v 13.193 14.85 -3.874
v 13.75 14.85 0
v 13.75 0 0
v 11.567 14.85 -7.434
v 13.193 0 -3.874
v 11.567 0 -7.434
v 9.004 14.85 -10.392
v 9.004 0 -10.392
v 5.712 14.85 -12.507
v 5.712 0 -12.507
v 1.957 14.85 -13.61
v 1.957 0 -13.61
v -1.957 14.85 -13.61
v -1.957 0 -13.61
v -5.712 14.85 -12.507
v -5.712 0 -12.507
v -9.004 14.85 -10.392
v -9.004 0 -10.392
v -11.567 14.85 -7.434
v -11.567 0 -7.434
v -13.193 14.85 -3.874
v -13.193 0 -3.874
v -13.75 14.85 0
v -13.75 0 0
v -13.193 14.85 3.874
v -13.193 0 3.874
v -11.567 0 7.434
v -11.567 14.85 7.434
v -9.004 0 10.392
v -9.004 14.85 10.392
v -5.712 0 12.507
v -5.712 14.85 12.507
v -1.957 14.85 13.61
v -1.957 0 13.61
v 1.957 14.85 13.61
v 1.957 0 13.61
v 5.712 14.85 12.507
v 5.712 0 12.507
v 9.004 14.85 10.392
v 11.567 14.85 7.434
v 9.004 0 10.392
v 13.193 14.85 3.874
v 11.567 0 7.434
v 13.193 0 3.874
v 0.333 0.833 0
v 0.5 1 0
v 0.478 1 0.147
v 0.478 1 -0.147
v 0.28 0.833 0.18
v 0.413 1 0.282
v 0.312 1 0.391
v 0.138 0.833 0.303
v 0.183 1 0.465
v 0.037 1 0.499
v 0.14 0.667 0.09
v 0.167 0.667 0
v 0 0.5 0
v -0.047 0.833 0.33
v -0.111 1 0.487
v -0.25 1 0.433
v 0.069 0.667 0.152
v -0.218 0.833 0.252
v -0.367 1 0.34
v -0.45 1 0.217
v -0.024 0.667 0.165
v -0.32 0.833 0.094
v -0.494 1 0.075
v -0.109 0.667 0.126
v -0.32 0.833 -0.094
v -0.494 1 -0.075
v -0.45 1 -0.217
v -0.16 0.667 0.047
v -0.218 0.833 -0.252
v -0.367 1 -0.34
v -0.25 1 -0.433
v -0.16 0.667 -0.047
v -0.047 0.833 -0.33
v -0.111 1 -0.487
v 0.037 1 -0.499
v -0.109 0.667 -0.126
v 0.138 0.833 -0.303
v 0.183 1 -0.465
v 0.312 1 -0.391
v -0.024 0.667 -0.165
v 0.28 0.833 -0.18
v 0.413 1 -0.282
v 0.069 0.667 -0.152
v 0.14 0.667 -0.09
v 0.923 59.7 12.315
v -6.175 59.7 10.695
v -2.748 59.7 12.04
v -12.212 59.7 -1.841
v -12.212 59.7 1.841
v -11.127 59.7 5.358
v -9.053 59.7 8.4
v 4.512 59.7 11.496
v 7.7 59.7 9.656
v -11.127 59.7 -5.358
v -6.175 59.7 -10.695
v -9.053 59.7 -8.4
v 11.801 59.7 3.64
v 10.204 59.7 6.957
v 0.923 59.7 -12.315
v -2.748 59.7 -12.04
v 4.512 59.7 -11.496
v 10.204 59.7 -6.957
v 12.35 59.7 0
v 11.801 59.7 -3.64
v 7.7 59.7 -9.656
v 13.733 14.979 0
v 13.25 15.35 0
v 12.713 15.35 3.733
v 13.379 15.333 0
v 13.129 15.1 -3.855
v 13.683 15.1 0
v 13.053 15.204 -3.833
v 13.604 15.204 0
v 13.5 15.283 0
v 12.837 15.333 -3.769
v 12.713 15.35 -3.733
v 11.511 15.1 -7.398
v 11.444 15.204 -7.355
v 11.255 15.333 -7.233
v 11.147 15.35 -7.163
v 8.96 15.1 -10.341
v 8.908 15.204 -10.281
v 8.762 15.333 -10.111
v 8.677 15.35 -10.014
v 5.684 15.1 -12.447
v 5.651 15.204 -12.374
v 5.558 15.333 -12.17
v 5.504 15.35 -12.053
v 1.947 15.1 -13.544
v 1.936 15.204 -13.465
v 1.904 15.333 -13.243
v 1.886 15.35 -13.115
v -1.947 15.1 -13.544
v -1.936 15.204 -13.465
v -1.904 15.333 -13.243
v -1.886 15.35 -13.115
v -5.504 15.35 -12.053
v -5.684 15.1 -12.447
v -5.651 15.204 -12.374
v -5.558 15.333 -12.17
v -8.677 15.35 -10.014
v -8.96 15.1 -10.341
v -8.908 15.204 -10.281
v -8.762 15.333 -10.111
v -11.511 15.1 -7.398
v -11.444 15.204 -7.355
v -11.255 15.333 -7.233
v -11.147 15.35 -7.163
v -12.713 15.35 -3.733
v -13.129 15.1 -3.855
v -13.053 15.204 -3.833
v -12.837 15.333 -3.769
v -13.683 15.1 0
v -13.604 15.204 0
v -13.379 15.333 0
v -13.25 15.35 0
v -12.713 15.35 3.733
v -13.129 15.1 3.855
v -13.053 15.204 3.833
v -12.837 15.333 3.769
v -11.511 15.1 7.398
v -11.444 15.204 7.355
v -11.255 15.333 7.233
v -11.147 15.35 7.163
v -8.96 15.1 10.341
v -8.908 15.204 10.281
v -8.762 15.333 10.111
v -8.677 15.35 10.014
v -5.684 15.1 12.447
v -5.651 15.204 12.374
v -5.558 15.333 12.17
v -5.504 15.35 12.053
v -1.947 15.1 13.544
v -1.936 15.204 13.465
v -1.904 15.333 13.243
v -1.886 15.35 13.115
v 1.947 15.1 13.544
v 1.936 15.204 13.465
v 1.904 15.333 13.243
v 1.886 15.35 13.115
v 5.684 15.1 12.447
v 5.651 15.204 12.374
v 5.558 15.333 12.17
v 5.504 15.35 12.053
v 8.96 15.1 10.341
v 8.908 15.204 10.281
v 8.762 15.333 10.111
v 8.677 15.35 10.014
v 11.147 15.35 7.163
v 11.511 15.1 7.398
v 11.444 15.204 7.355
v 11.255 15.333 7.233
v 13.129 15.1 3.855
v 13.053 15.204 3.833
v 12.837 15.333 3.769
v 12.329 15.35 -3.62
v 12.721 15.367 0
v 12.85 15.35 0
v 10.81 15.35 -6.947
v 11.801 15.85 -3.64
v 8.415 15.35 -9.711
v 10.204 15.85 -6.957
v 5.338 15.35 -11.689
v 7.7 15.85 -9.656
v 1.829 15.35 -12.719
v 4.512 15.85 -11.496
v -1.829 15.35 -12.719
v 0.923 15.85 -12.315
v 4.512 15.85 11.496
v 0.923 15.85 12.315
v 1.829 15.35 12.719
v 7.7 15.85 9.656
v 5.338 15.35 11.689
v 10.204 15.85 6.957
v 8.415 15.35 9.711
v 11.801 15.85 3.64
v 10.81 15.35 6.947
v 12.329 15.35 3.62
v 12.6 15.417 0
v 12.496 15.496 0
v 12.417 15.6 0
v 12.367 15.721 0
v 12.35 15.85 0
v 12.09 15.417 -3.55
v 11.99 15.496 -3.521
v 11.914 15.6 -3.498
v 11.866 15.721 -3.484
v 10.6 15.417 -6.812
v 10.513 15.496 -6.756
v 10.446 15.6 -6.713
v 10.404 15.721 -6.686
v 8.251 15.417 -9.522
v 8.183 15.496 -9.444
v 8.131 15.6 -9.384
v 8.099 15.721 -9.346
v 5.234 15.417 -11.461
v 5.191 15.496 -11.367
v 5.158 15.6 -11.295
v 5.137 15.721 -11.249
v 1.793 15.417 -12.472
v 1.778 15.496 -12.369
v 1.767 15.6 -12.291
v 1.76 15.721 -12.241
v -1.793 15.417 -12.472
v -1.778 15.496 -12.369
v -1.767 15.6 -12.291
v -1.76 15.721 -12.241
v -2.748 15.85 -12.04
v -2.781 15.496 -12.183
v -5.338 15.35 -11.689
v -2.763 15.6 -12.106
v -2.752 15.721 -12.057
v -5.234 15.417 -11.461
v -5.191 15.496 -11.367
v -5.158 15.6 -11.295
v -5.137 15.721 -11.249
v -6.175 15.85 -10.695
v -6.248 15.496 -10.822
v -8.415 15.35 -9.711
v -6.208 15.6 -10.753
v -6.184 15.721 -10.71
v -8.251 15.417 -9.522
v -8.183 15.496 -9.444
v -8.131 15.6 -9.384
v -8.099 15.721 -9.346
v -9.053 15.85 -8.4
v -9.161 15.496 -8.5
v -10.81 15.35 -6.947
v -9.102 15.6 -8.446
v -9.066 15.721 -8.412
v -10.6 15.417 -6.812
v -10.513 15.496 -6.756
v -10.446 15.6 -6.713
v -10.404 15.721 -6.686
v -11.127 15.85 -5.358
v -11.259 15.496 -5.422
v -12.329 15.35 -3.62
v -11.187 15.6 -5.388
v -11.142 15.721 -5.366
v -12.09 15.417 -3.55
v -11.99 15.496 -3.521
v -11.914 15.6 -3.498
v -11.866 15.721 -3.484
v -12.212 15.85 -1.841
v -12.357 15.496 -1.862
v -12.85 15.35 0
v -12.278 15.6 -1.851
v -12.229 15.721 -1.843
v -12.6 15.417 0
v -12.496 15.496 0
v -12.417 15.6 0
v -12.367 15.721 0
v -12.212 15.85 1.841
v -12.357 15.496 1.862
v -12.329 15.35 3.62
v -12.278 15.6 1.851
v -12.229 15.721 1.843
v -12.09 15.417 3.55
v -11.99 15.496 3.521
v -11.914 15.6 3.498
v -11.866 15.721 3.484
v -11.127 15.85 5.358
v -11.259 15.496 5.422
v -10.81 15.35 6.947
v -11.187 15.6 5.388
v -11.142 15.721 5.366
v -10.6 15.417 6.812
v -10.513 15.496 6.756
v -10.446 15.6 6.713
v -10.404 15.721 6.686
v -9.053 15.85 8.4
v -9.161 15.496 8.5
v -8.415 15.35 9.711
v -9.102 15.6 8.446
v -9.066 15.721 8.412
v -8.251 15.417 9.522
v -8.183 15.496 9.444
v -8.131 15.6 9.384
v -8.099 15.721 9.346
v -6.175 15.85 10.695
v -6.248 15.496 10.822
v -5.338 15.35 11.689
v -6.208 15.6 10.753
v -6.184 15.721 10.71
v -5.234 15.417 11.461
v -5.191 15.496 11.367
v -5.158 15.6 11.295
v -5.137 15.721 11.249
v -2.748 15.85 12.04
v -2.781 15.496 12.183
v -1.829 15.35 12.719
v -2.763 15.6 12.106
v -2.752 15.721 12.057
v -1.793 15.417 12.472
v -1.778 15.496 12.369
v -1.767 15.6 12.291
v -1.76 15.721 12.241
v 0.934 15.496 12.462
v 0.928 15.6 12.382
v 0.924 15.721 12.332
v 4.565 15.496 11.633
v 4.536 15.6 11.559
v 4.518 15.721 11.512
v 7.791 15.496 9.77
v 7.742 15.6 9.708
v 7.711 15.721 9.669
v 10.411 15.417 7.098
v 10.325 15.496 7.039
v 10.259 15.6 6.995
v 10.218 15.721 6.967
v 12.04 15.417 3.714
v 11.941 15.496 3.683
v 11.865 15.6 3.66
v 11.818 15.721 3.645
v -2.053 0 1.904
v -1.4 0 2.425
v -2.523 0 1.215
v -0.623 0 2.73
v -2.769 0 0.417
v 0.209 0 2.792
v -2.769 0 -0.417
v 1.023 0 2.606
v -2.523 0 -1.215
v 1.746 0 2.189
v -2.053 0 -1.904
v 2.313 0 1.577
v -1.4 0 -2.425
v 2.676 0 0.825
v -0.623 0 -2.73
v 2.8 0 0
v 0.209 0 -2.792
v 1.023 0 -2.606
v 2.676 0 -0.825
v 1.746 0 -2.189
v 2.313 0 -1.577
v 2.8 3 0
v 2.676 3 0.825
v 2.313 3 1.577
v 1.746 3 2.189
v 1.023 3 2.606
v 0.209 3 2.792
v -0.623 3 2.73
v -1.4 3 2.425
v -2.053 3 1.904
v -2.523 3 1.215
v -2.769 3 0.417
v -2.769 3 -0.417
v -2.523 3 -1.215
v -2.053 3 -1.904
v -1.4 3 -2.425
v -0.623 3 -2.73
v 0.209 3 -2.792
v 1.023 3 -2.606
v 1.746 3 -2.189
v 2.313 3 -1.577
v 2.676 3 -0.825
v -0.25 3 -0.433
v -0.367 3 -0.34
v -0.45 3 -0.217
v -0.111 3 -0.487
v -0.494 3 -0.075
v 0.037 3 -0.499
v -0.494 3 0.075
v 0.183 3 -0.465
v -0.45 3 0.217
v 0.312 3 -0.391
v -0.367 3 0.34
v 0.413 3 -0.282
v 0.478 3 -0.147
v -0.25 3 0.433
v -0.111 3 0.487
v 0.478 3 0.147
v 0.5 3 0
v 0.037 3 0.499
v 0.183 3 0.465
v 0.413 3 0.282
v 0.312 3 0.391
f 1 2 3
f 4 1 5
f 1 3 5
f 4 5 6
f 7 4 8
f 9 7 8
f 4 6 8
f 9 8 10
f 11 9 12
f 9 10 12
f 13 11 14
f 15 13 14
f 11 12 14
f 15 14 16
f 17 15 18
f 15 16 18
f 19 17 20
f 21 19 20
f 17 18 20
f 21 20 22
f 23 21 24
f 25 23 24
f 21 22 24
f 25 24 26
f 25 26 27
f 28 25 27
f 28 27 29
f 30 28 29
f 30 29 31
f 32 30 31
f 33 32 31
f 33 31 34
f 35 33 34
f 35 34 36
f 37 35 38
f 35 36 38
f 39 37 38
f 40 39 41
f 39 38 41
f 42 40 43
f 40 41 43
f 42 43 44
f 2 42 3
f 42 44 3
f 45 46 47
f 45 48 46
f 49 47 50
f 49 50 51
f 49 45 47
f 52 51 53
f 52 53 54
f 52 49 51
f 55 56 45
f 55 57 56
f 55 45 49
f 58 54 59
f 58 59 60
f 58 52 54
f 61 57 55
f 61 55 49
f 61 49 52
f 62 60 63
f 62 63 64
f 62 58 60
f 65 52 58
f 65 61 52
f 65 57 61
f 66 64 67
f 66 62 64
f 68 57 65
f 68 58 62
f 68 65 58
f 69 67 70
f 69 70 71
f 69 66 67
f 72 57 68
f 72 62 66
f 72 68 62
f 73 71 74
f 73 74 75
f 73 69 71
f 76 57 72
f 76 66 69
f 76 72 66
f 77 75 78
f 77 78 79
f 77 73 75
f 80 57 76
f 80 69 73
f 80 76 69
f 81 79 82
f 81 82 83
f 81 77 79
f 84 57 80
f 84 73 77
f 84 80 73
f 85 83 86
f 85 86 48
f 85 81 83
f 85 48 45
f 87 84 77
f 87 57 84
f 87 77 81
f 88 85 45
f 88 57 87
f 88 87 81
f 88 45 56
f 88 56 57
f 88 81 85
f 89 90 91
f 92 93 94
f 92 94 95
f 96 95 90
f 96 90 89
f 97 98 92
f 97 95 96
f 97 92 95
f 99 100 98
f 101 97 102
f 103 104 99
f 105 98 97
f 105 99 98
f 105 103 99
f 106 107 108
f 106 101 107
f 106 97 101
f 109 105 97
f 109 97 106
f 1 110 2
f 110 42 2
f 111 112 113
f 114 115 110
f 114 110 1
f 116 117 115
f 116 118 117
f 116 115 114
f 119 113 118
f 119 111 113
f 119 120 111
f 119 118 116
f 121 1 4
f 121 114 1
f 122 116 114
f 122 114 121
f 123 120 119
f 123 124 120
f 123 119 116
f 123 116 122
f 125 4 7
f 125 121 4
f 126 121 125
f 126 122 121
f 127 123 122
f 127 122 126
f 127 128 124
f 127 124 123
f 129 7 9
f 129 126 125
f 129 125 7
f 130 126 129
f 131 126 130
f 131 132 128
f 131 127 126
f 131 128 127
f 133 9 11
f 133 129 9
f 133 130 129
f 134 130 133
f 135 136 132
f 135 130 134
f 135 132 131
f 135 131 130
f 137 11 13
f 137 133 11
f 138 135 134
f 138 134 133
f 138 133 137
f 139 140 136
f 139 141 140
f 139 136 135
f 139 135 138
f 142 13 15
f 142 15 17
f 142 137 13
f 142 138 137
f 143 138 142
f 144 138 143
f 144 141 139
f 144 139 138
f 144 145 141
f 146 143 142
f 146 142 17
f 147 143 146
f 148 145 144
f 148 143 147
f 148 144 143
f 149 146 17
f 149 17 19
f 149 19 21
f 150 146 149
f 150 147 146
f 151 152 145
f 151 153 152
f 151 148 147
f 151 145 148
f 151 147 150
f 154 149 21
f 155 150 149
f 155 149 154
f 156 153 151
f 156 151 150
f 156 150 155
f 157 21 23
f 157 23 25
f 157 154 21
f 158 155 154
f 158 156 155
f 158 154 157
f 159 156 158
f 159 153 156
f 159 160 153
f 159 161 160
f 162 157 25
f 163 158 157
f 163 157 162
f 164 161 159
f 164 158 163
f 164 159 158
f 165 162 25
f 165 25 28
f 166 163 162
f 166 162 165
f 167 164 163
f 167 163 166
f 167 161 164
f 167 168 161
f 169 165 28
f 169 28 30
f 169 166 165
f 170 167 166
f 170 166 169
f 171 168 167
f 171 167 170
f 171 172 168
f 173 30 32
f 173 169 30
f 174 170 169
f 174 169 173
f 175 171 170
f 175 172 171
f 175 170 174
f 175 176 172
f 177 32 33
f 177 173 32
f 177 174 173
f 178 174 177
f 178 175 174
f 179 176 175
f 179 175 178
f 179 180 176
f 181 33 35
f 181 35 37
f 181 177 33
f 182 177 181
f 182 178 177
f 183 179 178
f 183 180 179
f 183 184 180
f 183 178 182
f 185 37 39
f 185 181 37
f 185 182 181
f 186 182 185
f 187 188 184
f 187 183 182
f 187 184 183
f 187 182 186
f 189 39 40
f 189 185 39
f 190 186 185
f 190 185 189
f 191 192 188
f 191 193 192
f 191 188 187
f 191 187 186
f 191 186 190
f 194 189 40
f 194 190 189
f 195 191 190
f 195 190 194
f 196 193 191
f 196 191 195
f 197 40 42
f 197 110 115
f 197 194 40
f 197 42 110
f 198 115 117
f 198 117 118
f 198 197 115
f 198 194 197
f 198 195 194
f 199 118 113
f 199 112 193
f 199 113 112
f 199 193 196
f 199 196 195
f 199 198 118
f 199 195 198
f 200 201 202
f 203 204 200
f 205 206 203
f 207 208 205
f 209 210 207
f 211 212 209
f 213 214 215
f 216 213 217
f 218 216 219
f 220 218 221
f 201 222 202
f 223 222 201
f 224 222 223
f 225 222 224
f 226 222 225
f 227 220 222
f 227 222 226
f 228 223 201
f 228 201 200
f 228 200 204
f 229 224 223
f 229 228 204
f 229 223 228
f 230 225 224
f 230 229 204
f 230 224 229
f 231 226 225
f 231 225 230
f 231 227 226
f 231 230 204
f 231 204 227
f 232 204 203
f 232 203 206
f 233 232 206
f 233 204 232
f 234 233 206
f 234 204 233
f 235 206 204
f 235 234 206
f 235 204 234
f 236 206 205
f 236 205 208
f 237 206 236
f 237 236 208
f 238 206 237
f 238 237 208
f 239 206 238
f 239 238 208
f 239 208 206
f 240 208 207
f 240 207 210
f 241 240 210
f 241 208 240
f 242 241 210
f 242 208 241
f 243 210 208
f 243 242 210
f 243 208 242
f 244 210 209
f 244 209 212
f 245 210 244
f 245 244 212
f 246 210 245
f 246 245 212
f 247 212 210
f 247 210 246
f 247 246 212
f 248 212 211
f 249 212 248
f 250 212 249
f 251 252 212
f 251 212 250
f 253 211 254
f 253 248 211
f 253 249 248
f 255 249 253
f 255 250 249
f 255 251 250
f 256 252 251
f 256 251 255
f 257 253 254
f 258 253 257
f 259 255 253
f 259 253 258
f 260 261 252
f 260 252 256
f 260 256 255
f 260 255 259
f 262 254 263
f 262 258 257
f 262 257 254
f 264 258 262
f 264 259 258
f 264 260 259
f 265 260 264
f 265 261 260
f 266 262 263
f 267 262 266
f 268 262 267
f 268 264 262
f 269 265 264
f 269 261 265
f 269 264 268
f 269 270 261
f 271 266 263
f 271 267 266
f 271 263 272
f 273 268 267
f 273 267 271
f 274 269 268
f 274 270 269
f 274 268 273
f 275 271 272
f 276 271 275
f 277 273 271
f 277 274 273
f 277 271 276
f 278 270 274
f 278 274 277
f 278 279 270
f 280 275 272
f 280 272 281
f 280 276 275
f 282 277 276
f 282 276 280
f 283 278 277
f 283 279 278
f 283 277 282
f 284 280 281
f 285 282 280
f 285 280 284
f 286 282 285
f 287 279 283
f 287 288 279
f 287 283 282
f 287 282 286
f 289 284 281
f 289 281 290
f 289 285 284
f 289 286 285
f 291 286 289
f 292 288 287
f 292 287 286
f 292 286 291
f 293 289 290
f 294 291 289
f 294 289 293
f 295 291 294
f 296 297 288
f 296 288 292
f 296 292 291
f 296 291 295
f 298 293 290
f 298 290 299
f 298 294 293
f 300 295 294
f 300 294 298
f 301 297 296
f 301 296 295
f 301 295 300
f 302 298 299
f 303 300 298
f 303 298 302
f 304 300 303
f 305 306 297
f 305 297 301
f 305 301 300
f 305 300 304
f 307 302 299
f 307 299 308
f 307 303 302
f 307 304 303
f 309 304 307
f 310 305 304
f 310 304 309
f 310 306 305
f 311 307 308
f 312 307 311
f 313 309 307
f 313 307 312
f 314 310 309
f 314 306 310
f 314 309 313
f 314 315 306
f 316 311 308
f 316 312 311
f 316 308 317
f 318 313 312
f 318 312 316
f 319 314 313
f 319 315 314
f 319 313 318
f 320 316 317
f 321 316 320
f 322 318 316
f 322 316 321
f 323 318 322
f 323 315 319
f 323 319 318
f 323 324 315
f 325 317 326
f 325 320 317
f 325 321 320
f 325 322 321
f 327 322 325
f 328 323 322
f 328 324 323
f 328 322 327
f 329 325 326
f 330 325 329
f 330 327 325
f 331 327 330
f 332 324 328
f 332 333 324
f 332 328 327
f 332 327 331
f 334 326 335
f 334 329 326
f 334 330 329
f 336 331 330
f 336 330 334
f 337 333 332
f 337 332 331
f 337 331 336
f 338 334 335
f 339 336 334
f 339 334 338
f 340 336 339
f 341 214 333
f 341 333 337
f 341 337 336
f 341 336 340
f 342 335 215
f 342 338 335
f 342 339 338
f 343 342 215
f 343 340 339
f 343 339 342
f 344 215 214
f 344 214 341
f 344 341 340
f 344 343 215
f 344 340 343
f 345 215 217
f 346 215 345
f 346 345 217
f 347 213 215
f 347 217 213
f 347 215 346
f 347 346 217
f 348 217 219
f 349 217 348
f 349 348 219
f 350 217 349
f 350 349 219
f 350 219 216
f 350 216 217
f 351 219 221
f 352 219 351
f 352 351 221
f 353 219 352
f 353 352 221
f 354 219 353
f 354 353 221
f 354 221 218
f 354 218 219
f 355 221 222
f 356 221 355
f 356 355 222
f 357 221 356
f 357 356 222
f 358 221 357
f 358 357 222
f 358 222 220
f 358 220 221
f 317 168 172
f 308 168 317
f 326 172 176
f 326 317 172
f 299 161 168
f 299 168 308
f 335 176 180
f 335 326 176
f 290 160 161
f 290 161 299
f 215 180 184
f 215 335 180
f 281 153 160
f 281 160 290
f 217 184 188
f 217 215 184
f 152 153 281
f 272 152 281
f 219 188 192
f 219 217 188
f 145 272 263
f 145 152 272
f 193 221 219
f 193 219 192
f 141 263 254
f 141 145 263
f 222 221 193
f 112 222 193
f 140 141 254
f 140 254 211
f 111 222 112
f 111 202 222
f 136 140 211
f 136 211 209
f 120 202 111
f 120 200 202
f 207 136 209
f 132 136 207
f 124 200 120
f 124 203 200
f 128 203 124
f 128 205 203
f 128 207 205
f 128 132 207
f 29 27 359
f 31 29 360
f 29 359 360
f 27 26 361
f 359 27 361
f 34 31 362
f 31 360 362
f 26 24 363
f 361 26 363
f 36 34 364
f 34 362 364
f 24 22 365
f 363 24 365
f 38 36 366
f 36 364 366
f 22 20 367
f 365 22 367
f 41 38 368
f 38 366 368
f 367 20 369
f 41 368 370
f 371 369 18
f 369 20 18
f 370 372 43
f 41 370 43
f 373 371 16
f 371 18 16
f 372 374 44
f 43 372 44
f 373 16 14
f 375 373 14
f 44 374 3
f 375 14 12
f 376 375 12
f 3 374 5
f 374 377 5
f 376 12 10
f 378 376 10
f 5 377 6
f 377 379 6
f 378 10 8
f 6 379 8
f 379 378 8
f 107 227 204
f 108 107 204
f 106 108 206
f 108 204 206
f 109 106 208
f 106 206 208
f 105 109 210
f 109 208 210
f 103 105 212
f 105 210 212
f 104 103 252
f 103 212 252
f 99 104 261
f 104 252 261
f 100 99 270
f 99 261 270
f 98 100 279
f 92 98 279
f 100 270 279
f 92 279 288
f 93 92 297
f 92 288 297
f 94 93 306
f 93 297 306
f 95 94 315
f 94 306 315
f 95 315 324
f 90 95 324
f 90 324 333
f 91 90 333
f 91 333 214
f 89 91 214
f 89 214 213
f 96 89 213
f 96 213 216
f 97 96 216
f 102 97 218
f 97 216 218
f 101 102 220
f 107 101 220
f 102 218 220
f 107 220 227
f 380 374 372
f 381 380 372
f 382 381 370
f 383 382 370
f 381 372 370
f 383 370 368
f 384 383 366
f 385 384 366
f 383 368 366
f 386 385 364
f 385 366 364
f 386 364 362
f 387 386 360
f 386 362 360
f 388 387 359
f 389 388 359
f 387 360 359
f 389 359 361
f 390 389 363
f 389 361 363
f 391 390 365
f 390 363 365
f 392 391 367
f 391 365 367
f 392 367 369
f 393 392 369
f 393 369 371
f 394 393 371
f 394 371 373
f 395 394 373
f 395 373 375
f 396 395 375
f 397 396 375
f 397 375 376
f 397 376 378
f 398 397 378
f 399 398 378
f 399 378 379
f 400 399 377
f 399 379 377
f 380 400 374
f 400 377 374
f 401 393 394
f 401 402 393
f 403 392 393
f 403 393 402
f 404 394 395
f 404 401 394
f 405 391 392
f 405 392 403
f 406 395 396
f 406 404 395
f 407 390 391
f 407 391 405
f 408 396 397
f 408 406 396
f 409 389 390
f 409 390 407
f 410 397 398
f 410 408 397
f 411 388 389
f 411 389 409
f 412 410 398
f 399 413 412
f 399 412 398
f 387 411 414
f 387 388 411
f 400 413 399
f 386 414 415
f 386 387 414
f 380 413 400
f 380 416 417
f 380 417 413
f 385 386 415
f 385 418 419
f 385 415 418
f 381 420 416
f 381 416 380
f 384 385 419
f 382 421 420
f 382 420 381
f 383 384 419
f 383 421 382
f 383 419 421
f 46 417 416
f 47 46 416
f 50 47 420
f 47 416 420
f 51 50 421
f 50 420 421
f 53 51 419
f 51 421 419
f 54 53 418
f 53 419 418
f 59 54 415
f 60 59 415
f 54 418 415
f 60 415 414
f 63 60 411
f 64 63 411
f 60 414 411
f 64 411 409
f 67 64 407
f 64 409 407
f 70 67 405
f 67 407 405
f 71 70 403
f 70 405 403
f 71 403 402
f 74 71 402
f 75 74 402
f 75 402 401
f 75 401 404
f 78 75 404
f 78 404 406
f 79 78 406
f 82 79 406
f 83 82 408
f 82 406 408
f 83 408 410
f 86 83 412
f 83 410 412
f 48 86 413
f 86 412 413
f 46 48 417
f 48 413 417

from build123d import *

# Parameters (mm, degrees)
SKETCH1_R           = 13.75
BOSS_EXTRUDE1_DEPTH = 15.35
SKETCH2_R           = 12.35
BOSS_EXTRUDE2_DEPTH = 44.35
FILLET1_R           = 0.5
SKETCH3_R           = 2.8
CUT_EXTRUDE1_DEPTH  = 3
SKETCH4_R           = 0.5
BOSS_EXTRUDE3_DEPTH = 2.5
CHAMFER1_SIZE       = 0.5


with BuildPart() as part:
    # Sketch1 → Boss-Extrude1 (new body)
    with BuildSketch(Plane(origin=(0, 0, 0), x_dir=(1, 0, 0), z_dir=(0, 1, 0))):
        Circle(SKETCH1_R)
    extrude(amount=BOSS_EXTRUDE1_DEPTH)

    # Sketch2 → Boss-Extrude2 (add)
    with BuildSketch(Plane(origin=(0, 15.35, 0), x_dir=(1, 0, 0), z_dir=(0, 1, 0))):
        Circle(SKETCH2_R)
    extrude(amount=BOSS_EXTRUDE2_DEPTH)

    # Fillet1
    fillet1_edges = [part.edges().sort_by_distance(p)[0] for p in [
        (-13.75, 15.35, 0),
        (-12.35, 15.35, 0),
    ]]
    fillet(fillet1_edges, radius=FILLET1_R)

    # Sketch3 → Cut-Extrude1 (cut)
    with BuildSketch(Plane.XZ):
        Circle(SKETCH3_R)
    extrude(amount=-CUT_EXTRUDE1_DEPTH, mode=Mode.SUBTRACT)

    # Sketch4 → Boss-Extrude3 (add)
    with BuildSketch(Plane.XZ.offset(-3)):
        Circle(SKETCH4_R)
    extrude(amount=BOSS_EXTRUDE3_DEPTH)

    # Chamfer1
    chamfer1_edges = [part.edges().sort_by_distance(p)[0] for p in [
        (-0.5, 0.5, 0),
    ]]
    chamfer(chamfer1_edges, length=CHAMFER1_SIZE)


solid = part.part
